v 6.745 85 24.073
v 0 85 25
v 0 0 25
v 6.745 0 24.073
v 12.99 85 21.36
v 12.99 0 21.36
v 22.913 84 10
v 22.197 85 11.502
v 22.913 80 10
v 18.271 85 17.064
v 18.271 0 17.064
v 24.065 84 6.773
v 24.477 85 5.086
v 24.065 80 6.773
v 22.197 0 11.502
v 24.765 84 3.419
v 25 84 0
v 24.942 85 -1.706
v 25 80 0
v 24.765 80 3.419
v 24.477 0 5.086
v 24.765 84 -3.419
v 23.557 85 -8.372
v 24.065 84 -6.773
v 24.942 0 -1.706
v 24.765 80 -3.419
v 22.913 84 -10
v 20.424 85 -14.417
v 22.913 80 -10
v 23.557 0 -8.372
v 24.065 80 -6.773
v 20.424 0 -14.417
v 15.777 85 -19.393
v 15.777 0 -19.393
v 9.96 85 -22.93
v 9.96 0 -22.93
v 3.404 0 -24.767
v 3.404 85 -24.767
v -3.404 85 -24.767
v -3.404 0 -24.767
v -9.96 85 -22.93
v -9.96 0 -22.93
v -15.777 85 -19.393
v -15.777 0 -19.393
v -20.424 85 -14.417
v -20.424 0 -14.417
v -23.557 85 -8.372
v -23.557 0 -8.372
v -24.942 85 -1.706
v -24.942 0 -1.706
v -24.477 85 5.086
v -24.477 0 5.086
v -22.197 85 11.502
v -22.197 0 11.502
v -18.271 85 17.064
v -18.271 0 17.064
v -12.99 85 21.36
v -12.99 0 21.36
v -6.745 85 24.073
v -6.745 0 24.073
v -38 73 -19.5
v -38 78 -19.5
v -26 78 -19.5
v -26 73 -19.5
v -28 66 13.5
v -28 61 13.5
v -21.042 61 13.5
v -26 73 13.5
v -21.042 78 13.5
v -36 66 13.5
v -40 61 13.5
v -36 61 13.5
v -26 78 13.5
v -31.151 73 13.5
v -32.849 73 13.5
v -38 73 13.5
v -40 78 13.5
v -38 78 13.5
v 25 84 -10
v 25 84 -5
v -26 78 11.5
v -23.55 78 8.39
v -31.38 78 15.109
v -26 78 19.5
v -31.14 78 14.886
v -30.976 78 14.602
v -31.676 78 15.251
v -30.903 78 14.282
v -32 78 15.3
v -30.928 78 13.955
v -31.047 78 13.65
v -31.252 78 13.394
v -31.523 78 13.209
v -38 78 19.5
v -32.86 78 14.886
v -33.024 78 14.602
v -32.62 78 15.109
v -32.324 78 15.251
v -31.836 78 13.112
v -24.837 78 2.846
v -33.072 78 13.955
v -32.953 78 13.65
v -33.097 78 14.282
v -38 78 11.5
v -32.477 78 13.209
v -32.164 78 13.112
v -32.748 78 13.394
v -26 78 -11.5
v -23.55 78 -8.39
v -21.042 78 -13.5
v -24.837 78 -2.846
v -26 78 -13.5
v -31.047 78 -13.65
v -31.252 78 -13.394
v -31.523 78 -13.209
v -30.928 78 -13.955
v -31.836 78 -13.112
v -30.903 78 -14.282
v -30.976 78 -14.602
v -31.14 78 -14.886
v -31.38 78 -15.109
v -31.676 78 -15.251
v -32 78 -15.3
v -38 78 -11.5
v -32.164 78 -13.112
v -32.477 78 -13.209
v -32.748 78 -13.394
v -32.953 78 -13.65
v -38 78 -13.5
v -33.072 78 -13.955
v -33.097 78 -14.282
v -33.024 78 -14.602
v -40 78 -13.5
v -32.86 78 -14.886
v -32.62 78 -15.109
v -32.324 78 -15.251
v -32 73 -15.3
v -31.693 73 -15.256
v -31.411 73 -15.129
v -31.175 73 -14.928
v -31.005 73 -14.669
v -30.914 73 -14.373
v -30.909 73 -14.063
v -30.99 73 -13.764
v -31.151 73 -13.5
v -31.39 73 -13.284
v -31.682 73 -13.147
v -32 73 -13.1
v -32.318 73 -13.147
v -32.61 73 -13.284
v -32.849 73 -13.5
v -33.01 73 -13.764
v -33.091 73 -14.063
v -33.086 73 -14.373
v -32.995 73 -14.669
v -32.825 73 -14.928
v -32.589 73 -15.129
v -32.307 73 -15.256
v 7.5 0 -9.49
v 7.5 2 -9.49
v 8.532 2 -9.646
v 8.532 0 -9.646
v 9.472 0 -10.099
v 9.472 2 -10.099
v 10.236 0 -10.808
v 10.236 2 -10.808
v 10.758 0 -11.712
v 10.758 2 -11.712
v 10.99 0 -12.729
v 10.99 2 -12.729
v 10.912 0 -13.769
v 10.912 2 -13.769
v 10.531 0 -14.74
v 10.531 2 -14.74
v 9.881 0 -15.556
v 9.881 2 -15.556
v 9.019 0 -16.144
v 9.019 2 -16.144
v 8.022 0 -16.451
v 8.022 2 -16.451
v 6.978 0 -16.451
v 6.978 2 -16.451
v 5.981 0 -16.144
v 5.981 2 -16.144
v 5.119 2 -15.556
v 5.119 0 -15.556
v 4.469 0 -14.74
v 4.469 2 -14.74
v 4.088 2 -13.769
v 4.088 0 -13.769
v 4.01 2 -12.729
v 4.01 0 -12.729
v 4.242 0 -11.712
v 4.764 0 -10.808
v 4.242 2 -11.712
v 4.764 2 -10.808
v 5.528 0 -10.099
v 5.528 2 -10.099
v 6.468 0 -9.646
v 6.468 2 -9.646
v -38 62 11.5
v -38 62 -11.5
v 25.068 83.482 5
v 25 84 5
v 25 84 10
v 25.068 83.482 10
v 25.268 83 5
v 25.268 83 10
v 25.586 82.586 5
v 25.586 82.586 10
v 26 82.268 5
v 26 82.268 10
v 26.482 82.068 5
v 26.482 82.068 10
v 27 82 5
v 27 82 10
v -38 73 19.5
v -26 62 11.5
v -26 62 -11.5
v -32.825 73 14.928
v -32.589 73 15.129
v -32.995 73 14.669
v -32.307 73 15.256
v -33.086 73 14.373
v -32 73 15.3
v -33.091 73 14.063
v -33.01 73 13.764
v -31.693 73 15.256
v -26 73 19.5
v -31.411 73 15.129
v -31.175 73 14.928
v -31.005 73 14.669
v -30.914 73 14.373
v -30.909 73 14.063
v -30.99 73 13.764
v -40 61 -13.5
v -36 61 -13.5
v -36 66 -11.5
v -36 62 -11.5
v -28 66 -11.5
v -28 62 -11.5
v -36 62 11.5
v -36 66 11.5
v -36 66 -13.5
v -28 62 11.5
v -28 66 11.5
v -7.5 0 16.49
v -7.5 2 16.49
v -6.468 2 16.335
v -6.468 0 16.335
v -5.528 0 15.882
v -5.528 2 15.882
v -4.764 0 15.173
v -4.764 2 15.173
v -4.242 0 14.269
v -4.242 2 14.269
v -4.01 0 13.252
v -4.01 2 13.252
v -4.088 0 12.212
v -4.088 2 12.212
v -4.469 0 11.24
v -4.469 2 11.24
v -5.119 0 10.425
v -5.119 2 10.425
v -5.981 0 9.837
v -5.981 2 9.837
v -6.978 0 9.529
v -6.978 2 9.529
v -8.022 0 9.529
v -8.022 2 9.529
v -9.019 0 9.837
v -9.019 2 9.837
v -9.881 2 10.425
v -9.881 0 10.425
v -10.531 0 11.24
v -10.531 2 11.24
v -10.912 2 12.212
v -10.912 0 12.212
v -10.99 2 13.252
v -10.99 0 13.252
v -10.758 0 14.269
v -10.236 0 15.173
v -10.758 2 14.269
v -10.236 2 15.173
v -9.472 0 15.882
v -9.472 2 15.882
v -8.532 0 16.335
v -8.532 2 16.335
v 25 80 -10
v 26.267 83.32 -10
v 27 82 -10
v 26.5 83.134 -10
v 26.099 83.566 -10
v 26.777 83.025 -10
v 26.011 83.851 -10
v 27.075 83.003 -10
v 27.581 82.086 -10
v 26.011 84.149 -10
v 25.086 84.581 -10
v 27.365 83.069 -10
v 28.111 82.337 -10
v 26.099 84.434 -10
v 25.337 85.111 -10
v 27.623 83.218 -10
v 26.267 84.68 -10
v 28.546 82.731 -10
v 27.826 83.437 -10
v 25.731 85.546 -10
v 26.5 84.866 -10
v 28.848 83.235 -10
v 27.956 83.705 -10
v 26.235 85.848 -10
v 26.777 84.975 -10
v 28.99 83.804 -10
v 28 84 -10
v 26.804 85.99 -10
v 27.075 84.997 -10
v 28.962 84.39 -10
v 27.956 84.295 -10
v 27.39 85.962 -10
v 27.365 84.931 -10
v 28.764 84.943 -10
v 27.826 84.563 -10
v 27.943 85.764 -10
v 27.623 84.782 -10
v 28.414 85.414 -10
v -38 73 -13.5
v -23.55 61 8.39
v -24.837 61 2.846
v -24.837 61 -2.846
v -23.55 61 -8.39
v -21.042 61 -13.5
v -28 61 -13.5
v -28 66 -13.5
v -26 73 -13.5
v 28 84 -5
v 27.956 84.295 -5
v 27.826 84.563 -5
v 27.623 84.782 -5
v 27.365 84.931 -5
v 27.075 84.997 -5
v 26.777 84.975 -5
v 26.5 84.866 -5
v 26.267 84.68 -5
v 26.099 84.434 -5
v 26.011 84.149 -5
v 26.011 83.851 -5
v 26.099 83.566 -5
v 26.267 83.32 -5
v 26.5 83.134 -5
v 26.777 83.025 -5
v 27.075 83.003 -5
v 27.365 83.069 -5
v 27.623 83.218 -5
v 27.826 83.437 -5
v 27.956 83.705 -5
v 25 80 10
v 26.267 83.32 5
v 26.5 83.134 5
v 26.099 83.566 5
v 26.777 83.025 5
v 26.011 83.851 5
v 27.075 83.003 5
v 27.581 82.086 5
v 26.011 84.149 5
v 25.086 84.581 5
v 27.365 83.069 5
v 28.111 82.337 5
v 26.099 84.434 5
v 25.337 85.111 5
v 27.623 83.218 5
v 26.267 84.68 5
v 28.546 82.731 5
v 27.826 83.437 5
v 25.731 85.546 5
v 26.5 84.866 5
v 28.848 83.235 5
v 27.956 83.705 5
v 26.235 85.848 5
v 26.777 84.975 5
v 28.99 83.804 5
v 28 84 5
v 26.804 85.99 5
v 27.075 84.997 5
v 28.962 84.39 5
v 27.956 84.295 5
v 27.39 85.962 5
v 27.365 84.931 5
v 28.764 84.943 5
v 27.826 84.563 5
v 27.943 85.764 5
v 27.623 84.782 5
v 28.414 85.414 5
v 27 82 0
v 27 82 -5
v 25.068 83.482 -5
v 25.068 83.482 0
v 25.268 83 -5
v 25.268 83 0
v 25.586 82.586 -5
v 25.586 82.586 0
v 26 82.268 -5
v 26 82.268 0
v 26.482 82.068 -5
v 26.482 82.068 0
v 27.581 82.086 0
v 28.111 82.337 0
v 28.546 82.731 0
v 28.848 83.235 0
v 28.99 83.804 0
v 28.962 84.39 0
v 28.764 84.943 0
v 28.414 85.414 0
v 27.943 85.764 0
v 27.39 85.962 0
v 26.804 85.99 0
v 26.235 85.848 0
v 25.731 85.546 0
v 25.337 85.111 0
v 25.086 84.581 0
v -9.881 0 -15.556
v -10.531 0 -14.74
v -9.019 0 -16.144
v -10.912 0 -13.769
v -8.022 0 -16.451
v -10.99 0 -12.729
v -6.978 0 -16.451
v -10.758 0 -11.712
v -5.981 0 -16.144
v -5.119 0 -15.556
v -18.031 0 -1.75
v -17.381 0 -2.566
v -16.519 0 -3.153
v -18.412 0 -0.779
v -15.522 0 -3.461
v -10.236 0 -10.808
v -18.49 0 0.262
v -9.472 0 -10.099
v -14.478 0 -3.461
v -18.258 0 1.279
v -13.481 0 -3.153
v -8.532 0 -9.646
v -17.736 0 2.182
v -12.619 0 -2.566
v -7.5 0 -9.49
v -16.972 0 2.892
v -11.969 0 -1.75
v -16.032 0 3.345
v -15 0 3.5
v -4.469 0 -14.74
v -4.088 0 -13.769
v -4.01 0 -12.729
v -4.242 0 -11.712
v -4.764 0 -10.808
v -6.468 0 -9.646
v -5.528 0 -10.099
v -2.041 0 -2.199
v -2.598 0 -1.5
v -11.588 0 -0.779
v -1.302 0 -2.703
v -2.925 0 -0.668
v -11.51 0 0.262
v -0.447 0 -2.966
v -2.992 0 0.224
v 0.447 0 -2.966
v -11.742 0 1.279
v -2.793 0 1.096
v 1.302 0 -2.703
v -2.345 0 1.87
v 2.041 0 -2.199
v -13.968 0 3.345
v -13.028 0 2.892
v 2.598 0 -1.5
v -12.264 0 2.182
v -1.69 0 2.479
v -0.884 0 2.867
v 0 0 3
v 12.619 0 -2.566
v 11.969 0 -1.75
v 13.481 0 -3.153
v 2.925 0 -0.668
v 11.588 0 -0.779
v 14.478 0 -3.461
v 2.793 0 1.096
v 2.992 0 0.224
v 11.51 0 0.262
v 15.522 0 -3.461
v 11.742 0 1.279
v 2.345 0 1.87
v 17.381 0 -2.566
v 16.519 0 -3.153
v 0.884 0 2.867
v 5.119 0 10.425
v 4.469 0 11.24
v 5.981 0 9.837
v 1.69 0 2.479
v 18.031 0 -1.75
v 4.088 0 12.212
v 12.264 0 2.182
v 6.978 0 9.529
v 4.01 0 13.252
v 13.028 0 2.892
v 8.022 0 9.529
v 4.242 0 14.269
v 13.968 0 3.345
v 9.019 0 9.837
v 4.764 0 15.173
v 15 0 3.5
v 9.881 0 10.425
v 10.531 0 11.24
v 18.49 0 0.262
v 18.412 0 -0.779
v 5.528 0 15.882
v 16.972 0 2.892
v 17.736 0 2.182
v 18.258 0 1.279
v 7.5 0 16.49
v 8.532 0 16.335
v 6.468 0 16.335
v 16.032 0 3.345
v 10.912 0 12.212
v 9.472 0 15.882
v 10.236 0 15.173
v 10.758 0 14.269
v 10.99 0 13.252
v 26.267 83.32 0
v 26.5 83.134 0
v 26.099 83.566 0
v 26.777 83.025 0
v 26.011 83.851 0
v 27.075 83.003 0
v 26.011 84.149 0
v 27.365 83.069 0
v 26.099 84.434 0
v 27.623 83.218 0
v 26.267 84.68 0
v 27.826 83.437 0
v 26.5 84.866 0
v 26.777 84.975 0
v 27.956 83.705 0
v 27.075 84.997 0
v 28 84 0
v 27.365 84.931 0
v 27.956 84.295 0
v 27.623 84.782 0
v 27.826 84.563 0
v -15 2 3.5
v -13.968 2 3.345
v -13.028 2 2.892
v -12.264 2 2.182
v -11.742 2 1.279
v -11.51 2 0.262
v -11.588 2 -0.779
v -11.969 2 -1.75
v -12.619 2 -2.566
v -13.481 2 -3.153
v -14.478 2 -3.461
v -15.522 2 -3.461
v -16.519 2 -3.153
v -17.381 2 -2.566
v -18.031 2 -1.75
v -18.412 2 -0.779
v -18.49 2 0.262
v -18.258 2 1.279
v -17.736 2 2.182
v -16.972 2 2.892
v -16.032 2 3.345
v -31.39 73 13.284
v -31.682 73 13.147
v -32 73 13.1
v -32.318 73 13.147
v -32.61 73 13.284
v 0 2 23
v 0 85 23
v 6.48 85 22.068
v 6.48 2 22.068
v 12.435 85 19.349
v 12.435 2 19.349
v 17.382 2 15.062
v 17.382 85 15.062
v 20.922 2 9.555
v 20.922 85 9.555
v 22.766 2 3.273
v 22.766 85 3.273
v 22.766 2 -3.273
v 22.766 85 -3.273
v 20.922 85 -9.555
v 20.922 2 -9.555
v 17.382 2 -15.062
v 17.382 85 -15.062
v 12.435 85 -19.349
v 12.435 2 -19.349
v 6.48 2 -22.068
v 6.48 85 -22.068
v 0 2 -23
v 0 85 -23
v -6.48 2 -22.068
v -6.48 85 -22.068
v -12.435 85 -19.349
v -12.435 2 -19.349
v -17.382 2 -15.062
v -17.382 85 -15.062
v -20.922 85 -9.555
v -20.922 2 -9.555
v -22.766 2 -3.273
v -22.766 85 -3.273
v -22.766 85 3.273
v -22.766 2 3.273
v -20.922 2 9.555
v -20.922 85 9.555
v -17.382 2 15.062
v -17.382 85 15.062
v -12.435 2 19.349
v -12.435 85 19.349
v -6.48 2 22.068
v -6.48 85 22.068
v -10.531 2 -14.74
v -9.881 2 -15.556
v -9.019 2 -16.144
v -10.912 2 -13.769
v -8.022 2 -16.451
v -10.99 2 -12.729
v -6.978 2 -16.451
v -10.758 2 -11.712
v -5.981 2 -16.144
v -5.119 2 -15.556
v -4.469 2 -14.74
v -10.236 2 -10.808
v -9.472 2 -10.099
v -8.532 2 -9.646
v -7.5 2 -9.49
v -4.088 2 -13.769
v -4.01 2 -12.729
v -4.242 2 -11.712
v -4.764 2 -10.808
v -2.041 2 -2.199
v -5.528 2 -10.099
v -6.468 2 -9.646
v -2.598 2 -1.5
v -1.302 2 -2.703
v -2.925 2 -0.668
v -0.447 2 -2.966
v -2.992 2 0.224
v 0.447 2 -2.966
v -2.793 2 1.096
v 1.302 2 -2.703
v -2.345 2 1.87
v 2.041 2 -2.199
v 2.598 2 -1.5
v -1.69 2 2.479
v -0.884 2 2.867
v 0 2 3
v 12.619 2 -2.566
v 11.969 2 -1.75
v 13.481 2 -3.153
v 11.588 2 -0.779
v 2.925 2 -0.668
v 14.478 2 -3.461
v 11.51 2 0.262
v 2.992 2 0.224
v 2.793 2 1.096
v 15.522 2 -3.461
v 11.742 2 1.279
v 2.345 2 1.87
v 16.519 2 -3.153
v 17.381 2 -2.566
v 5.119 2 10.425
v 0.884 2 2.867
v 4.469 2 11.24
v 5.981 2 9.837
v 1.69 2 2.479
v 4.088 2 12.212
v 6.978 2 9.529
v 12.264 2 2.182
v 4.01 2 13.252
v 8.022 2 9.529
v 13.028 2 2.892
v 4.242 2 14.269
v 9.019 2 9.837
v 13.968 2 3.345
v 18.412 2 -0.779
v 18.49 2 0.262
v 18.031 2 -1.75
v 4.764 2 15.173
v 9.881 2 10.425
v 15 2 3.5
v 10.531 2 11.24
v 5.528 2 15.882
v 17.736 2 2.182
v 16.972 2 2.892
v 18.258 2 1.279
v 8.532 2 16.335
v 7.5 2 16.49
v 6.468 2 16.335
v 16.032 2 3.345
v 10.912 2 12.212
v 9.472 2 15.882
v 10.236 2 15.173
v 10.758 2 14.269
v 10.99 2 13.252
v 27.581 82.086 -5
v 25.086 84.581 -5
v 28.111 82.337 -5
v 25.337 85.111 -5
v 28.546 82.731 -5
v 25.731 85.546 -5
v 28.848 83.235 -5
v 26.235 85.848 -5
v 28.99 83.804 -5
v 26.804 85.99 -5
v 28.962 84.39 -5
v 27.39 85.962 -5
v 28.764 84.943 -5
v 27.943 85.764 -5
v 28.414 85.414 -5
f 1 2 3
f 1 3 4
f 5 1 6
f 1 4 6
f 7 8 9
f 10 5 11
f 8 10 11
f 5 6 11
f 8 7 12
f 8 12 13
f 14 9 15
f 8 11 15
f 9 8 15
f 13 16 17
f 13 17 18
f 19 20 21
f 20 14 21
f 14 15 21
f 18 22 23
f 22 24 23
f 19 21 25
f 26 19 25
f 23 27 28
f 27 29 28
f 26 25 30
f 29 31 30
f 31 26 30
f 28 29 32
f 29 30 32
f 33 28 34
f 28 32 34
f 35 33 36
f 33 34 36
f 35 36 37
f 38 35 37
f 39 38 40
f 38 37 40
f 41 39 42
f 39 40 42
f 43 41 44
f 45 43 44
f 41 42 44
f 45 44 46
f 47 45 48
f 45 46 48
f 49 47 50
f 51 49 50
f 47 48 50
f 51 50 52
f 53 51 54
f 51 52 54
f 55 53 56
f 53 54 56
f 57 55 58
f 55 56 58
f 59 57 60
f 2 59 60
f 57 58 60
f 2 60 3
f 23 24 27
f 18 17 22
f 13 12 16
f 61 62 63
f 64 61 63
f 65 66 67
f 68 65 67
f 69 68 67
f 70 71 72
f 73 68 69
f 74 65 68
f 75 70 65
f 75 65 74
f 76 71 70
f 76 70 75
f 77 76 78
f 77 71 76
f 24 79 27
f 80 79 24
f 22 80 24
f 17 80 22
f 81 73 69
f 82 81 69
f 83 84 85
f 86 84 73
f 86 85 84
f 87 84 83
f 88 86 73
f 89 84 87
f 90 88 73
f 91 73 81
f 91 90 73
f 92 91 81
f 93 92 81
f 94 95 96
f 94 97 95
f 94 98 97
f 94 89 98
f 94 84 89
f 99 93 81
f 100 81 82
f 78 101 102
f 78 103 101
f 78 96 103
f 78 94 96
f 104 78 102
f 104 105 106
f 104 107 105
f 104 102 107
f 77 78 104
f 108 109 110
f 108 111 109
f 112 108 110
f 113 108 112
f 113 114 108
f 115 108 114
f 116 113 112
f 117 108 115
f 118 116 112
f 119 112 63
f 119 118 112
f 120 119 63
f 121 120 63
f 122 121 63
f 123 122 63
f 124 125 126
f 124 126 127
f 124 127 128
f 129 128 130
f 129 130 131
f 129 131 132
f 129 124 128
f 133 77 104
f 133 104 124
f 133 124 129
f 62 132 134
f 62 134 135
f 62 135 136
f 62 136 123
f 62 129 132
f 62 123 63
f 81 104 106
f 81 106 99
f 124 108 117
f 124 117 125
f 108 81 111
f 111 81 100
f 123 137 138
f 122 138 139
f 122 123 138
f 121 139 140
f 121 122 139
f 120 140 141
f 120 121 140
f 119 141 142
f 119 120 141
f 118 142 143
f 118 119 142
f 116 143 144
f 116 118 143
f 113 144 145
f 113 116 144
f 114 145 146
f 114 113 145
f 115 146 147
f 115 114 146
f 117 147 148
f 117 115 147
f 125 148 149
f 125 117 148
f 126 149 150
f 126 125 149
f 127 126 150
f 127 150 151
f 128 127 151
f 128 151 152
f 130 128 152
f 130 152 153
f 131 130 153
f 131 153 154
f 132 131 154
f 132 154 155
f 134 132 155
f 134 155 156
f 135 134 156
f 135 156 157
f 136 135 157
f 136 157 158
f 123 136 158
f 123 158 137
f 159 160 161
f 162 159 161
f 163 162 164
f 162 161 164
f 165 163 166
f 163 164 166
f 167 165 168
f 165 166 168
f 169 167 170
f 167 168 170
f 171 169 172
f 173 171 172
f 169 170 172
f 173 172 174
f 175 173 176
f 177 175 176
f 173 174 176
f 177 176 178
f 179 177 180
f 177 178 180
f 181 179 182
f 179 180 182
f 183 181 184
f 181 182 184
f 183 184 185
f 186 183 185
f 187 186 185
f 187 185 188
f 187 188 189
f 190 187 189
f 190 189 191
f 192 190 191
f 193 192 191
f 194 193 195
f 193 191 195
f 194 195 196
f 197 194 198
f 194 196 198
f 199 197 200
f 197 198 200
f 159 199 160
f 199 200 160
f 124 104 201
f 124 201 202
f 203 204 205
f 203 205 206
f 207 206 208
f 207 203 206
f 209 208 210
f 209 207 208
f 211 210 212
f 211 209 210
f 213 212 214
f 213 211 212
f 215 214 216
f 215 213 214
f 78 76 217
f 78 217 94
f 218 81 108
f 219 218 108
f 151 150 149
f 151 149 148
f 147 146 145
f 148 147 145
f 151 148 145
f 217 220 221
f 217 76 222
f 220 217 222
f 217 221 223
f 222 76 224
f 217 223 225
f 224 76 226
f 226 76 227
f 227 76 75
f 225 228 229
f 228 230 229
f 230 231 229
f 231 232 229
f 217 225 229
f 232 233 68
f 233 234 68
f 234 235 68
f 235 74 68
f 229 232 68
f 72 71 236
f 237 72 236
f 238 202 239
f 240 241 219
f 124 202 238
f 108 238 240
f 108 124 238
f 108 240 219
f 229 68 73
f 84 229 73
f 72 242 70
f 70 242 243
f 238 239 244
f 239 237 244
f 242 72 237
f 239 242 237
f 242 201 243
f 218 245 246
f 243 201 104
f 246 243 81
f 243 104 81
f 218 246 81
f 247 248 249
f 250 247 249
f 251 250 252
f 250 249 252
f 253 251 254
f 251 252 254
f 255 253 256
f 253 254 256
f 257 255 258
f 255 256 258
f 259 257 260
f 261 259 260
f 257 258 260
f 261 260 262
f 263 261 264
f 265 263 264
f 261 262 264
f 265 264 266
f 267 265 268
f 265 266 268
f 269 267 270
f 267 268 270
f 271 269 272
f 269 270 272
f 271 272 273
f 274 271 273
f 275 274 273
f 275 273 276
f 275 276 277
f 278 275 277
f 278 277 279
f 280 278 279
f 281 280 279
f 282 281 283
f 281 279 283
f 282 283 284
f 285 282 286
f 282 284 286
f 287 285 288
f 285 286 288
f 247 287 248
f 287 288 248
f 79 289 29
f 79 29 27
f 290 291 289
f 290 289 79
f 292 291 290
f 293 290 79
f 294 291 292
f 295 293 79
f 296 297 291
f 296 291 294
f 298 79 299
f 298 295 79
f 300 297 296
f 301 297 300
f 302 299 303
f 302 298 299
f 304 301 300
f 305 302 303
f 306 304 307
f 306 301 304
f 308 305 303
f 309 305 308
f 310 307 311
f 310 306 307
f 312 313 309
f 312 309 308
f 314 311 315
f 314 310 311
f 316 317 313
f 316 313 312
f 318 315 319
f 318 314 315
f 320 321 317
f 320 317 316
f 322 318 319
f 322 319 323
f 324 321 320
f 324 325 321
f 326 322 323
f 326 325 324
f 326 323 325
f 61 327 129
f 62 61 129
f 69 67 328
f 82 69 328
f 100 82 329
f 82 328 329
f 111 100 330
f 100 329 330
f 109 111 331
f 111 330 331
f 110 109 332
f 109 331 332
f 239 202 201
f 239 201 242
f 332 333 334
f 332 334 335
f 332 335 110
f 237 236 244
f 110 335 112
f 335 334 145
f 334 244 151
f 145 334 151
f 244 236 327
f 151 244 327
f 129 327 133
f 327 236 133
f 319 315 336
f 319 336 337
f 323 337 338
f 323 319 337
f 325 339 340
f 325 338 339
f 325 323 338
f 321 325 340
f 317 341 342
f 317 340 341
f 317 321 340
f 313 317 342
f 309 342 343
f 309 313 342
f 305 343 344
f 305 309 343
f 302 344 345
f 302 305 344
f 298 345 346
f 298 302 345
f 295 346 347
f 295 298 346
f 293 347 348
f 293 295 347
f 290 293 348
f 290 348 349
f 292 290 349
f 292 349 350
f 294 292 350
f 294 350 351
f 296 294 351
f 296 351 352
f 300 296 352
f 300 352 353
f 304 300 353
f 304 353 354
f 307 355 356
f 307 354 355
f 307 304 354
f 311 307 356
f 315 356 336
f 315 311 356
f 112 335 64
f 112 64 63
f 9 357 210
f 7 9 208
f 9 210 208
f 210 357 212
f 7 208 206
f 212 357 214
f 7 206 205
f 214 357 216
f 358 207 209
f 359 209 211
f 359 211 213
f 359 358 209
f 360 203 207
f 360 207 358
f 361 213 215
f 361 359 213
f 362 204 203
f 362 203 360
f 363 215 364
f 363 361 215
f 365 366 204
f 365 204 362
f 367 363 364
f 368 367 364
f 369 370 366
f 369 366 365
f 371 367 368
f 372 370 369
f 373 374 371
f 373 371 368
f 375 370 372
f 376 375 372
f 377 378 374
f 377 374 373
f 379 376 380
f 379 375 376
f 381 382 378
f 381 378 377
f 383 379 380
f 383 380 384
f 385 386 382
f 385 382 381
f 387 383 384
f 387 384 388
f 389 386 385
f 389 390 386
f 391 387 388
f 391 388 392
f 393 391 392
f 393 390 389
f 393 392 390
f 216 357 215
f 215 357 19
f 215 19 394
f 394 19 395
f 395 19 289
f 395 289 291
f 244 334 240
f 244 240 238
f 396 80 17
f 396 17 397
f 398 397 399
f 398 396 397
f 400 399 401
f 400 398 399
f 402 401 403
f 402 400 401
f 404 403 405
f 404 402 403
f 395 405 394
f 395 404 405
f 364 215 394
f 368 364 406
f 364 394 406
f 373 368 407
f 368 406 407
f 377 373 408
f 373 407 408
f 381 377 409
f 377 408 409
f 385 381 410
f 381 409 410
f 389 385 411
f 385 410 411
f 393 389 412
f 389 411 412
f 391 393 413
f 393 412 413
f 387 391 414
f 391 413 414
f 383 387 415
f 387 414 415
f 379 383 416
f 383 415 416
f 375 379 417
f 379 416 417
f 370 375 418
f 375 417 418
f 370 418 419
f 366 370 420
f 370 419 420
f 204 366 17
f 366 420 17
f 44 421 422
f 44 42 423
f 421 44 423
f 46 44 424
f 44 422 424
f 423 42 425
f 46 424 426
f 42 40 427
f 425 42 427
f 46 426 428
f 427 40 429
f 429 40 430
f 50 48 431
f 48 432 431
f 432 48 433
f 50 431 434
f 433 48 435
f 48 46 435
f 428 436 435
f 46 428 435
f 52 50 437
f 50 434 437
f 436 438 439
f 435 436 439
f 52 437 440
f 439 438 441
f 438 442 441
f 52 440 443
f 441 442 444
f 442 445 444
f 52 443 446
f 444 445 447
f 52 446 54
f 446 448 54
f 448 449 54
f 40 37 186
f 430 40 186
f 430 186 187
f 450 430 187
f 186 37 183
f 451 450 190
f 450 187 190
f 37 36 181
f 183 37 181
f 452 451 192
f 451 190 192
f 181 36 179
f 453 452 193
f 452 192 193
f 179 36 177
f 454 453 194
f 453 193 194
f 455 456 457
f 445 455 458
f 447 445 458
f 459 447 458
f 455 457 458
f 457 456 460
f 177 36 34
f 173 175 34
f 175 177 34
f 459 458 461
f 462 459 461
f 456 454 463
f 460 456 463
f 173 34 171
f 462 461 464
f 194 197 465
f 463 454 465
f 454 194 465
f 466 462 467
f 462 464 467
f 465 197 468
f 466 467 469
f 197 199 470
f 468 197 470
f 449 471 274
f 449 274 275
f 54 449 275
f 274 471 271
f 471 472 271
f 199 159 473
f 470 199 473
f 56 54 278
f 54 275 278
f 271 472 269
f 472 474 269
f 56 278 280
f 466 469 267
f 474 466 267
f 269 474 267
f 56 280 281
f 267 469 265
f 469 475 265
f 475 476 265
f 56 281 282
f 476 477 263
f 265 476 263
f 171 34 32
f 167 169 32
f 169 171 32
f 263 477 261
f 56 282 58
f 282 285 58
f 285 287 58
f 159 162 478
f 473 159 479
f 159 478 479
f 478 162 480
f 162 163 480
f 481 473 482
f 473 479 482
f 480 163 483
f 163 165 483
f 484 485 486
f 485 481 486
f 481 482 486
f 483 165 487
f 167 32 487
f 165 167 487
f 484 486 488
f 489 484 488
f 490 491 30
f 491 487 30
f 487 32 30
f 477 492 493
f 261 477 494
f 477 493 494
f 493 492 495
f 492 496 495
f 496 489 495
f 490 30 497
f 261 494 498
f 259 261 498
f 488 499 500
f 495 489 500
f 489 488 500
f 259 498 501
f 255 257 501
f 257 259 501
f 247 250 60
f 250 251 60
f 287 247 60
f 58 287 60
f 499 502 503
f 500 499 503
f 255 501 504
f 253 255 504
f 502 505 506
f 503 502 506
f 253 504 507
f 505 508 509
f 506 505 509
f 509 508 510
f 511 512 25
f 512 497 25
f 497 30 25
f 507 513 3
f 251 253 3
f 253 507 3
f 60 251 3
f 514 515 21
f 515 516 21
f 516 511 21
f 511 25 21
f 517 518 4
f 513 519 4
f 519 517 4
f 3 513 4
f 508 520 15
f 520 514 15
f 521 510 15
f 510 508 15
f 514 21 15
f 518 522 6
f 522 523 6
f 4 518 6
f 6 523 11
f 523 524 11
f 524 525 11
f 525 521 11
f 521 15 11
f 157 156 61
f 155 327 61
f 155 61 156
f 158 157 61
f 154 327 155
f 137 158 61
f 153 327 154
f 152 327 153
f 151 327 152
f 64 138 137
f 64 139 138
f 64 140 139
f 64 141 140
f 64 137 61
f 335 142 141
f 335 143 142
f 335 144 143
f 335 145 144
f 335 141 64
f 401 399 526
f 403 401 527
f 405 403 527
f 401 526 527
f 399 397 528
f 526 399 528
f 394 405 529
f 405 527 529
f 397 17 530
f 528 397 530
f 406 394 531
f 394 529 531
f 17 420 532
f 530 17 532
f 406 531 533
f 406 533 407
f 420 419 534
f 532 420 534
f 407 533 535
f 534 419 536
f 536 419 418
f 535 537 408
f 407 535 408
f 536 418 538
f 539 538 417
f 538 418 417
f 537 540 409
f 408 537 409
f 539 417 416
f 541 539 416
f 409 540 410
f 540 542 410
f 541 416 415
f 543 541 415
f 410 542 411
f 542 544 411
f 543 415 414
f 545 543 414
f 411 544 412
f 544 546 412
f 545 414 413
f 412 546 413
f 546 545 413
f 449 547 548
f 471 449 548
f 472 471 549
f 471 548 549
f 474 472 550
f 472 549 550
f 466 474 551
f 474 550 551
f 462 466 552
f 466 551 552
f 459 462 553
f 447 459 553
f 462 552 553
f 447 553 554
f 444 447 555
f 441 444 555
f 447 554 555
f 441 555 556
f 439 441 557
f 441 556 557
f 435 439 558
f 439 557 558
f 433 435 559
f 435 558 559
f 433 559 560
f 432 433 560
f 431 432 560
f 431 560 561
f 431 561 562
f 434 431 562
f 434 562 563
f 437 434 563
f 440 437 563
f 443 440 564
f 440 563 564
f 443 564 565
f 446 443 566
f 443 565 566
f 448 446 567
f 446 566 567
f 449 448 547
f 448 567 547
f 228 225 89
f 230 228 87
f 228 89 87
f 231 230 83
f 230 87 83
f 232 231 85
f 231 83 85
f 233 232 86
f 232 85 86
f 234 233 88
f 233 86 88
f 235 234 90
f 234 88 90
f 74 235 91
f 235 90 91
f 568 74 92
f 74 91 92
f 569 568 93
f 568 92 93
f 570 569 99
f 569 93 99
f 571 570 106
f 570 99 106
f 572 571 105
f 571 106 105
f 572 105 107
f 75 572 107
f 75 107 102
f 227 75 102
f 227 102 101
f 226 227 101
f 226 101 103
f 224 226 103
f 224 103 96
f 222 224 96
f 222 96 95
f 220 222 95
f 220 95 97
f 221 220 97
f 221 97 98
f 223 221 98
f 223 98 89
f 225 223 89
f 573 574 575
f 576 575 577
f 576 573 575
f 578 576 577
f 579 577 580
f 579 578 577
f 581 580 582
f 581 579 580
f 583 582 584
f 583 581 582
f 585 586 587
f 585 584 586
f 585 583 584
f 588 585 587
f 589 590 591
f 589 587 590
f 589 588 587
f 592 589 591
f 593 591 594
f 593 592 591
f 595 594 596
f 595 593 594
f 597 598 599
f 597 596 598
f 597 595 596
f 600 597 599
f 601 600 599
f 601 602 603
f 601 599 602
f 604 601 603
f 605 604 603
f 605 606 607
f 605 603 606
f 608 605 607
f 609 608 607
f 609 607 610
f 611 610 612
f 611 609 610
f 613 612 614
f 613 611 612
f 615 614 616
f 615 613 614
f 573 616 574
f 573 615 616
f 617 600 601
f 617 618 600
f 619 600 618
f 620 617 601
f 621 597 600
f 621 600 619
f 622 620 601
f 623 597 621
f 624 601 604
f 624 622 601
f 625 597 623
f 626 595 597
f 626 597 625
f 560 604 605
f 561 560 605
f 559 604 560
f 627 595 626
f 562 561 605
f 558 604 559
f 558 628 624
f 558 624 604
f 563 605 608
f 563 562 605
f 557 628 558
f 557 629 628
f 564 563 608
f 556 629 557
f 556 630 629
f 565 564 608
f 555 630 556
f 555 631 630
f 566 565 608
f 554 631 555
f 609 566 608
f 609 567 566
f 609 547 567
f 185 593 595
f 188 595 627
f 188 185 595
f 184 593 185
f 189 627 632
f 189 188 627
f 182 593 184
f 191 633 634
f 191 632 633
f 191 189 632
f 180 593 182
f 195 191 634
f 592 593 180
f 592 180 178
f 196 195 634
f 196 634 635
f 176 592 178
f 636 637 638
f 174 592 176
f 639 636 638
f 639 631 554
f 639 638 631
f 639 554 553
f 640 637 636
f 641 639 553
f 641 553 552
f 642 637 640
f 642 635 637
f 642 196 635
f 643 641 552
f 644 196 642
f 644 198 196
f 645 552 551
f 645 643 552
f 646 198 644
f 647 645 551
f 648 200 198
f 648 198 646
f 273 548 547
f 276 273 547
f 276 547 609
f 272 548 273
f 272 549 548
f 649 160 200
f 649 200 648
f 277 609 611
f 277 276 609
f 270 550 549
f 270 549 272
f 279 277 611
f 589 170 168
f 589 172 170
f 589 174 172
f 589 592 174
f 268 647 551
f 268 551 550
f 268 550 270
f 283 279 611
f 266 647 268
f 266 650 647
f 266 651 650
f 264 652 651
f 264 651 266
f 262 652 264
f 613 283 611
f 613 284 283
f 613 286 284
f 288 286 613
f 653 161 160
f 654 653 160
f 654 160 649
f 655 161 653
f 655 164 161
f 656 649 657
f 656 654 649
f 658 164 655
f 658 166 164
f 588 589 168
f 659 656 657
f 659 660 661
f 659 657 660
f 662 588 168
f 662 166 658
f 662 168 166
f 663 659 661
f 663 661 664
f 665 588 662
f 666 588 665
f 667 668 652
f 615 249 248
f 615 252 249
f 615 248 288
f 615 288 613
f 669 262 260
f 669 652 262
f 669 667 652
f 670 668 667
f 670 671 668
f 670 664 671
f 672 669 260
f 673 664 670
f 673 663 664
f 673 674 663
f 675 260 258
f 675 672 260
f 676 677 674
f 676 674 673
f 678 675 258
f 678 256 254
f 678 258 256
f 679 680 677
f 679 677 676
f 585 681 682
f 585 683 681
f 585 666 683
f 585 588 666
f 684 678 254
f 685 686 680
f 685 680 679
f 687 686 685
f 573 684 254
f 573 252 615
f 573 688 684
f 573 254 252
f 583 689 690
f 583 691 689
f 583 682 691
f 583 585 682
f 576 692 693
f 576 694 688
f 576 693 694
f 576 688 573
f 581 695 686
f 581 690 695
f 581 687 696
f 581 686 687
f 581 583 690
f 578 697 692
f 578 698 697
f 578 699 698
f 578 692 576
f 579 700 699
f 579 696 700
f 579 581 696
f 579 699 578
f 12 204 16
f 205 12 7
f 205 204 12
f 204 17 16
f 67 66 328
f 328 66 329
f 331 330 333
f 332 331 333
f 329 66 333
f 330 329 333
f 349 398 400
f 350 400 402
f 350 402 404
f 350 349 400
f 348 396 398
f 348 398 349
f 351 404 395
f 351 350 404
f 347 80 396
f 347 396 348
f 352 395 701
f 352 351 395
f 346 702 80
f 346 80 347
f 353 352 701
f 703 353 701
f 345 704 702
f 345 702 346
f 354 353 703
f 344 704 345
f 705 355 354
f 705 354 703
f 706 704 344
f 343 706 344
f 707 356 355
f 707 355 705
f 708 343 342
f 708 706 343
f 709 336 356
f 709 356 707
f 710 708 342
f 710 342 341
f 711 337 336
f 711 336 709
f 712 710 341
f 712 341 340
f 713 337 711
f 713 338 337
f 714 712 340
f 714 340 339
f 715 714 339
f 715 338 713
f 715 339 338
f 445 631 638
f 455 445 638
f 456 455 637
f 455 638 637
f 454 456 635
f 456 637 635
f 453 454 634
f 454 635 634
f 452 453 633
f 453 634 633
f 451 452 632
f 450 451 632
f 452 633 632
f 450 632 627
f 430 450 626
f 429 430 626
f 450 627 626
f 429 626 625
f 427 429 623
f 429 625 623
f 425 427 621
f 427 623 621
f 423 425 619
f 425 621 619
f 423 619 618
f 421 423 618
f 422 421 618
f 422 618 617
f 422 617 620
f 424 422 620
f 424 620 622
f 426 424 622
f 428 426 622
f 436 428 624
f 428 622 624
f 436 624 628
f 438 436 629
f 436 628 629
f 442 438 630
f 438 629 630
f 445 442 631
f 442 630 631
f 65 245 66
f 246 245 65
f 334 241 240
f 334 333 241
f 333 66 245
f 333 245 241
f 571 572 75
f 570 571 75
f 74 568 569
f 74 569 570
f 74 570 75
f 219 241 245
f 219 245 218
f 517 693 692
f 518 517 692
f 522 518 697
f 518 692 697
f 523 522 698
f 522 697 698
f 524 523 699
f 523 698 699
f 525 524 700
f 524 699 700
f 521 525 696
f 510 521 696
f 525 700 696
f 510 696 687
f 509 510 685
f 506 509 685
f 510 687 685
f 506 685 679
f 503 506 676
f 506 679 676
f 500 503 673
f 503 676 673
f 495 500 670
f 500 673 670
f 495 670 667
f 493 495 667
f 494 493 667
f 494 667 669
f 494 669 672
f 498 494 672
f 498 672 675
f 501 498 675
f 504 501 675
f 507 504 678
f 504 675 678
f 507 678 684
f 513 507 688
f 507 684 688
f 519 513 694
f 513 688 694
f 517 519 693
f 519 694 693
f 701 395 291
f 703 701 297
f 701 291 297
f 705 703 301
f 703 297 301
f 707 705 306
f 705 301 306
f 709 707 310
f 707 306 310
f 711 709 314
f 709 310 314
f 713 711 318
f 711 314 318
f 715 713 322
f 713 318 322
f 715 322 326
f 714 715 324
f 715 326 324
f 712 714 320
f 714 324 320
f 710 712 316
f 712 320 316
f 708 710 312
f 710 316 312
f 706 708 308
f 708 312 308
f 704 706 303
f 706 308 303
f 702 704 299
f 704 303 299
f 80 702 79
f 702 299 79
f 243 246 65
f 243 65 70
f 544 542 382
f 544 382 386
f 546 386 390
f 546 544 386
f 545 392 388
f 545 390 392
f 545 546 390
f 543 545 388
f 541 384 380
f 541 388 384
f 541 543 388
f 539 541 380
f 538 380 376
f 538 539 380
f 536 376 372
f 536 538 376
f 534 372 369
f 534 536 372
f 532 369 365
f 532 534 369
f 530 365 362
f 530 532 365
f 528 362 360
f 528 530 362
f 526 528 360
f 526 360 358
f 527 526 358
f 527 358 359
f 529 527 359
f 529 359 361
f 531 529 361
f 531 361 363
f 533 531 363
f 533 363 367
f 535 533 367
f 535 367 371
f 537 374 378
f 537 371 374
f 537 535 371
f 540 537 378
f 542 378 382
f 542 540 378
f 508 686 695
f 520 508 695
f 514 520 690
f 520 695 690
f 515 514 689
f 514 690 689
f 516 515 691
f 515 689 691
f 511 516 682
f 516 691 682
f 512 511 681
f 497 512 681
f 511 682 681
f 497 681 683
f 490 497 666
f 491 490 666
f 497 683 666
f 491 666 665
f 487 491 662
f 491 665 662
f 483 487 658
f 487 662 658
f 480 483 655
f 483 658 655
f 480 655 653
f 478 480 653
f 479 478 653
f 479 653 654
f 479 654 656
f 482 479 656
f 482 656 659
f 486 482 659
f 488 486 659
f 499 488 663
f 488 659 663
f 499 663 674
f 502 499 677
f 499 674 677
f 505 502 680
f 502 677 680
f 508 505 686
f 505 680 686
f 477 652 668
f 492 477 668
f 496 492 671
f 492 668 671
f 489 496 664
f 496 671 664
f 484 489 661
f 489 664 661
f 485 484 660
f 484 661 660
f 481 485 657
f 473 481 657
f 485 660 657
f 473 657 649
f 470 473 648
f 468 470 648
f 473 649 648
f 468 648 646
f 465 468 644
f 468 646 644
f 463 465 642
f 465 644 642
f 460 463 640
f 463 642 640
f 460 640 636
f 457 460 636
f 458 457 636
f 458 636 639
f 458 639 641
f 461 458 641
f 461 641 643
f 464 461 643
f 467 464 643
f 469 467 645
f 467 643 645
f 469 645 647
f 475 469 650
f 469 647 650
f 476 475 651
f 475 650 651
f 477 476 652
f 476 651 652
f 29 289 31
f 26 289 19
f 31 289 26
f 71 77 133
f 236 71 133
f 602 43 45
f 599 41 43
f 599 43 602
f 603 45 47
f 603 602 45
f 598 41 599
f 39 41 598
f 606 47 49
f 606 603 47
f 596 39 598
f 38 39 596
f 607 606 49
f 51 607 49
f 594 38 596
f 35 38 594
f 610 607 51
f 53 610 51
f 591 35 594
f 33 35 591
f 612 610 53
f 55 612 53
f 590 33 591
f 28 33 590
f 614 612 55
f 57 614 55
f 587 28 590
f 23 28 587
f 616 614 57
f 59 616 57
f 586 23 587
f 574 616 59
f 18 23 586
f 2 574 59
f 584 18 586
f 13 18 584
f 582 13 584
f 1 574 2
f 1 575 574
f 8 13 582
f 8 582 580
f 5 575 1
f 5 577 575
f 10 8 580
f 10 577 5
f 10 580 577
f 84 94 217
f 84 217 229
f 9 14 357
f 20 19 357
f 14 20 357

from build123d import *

# Parameters (mm, degrees)
SKETCH1_R                            = 25
BOSS_EXTRUDE1_DEPTH                  = 85
SHELL1_T                             = -2
SKETCH2_R                            = 3.5
CUT_EXTRUDE1_DEPTH                   = 2
BOSS_EXTRUDE4_DEPTH                  = 10
BOSS_EXTRUDE4_DEPTH_BACK             = 10
BOSS_EXTRUDE6_REACH                  = 104.572
SKETCH8_W                            = 20
SKETCH8_H                            = 4
CUT_EXTRUDE4_DEPTH                   = 98.272812234
CUT_EXTRUDE4_DEPTH_BACK              = 98.272812234
SKETCH9_R                            = 1
CUT_EXTRUDE5_START                   = -5
SKETCH10_R                           = 2
CUT_EXTRUDE5_DEPTH                   = 5
LPATTERN2_COUNT                      = 2
LPATTERN2_PITCH                      = 10
SKETCH11_W                           = 27
SKETCH11_H                           = 17
BOSS_EXTRUDE7_DEPTH                  = 15
BOSS_EXTRUDE7_DIRECTION_2_REACH      = 106.58
BOSS_EXTRUDE7_DIRECTION_2_END_RADIUS = 25
SKETCH12_W                           = 12
SKETCH12_H                           = 23
CUT_EXTRUDE6_DEPTH                   = 16
SKETCH13_W                           = 12
SKETCH13_H                           = 5
BOSS_EXTRUDE8_DEPTH                  = 6
SKETCH14_R                           = 1.1
CUT_EXTRUDE7_DEPTH                   = 5
CUT_EXTRUDE8_REACH                   = 104.363
SKETCH15_W                           = 8
SKETCH15_H                           = 5
SKETCH16_R                           = 3
CUT_EXTRUDE9_DEPTH                   = 2


with BuildPart() as part:
    # Sketch1 → Boss-Extrude1 (new body)
    with BuildSketch(Plane(origin=(0, 0, 0), x_dir=(1, 0, 0), z_dir=(0, 1, 0))):
        with Locations(Location((0, 0, 0), (0, 0, 270))):
            Circle(SKETCH1_R)
    extrude(amount=BOSS_EXTRUDE1_DEPTH)

    # Shell1
    shell1_openings = [part.faces().sort_by_distance(p)[0] for p in [
        (0, 85, 0),
    ]]
    offset(amount=SHELL1_T, openings=shell1_openings, kind=Kind.INTERSECTION)

    # Sketch2 → Cut-Extrude1 (cut)
    with BuildSketch(Plane(origin=(0, 2, 0), x_dir=(1, 0, 0), z_dir=(0, 1, 0))):
        with Locations(Location((15, 0, 0), (0, 0, 270))):
            Circle(SKETCH2_R)
        with Locations(Location((7.5, -12.990381057, 0), (0, 0, 270))):
            Circle(SKETCH2_R)
        with Locations(Location((-7.5, -12.990381057, 0), (0, 0, 270))):
            Circle(SKETCH2_R)
        with Locations(Location((-15, 0, 0), (0, 0, 270))):
            Circle(SKETCH2_R)
        with Locations(Location((-7.5, 12.990381057, 0), (0, 0, 270))):
            Circle(SKETCH2_R)
        with Locations(Location((7.5, 12.990381057, 0), (0, 0, 270))):
            Circle(SKETCH2_R)
    extrude(amount=-CUT_EXTRUDE1_DEPTH, mode=Mode.SUBTRACT)

    # Sketch8 → Boss-Extrude6 (add, up to next)
    with BuildSketch(Plane.ZY.offset(-25), mode=Mode.PRIVATE) as boss_extrude6_sk1:
        with Locations((0, 82)):
            Rectangle(SKETCH8_W, SKETCH8_H)
    boss_extrude6_tool1 = extrude(boss_extrude6_sk1.sketch, amount=BOSS_EXTRUDE6_REACH, mode=Mode.PRIVATE) - part.part


with BuildPart() as body_2:
    # Sketch3 → Boss-Extrude4 (new, two sides: drawn at the far end of the back side and taken through both)
    with BuildSketch(Plane.XY.offset(-BOSS_EXTRUDE4_DEPTH_BACK)):
        with BuildLine():
            Line((25, 84), (25, 80))
            Line((25, 80), (27, 82))
            ThreePointArc((27, 82), (28.414213562, 85.414213562), (25, 84))
        make_face()
    extrude(amount=BOSS_EXTRUDE4_DEPTH + BOSS_EXTRUDE4_DEPTH_BACK)


with BuildPart() as part_1:
    add(part.part)

    add(body_2.part)  # Boss-Extrude6 merges body 2
    add(boss_extrude6_tool1.solids().sort_by_distance((25, 82, 0))[0])
    add(boss_extrude6_tool1.solids().sort_by_distance((25, 82, 0))[1])

    # Sketch9 → Cut-Extrude4 (cut, two sides: drawn at the far end of the back side and taken through both)
    with BuildSketch(Plane.XY.offset(10).offset(-CUT_EXTRUDE4_DEPTH_BACK)):
        with Locations((27, 84)):
            Circle(SKETCH9_R)
    extrude(amount=CUT_EXTRUDE4_DEPTH + CUT_EXTRUDE4_DEPTH_BACK, mode=Mode.SUBTRACT)

    # Sketch10 → Cut-Extrude5 (cut)
    with BuildSketch(Plane.XY.offset(10).offset(CUT_EXTRUDE5_START)):
        with Locations((27, 84)):
            Circle(SKETCH10_R)
    cut_extrude5 = extrude(amount=CUT_EXTRUDE5_DEPTH, mode=Mode.SUBTRACT)

    # LPattern2: Cut-Extrude5 ×2
    with Locations(*[(0, 0, -i * LPATTERN2_PITCH) for i in range(1, LPATTERN2_COUNT)]):
        add(cut_extrude5, mode=Mode.SUBTRACT)

    # Sketch16 → Cut-Extrude9 (cut)
    with BuildSketch(Plane(origin=(0, 2, 0), x_dir=(1, 0, 0), z_dir=(0, 1, 0))):
        with Locations(Location((0, 0, 0), (0, 0, 270))):
            Circle(SKETCH16_R)
    extrude(amount=-CUT_EXTRUDE9_DEPTH, mode=Mode.SUBTRACT)


with BuildPart() as body_2_2:
    # Sketch11 → Boss-Extrude7 (new body)
    with BuildSketch(Plane(origin=(-25, 0, 0), x_dir=(0, 0, -1), z_dir=(1, 0, 0))):
        with Locations((0, 69.5)):
            Rectangle(SKETCH11_W, SKETCH11_H)
    extrude(amount=-BOSS_EXTRUDE7_DEPTH)

    # Boss-Extrude7 direction 2: up to this cylinder (the profile starts outside it)
    boss_extrude7_direction_2_end = Plane(origin=(0, 69.5, 0), z_dir=(0, -1, 0)) * Cylinder(BOSS_EXTRUDE7_DIRECTION_2_END_RADIUS, 264.16, mode=Mode.PRIVATE)
    # Sketch11 → Boss-Extrude7 direction 2 (add, up to the surface)
    with BuildSketch(Plane(origin=(-25, 0, 0), x_dir=(0, 0, -1), z_dir=(1, 0, 0)), mode=Mode.PRIVATE) as boss_extrude7_direction_2_sk1:
        with Locations((0, 69.5)):
            Rectangle(SKETCH11_W, SKETCH11_H)
    boss_extrude7_direction_2_tool1 = extrude(boss_extrude7_direction_2_sk1.sketch, amount=BOSS_EXTRUDE7_DIRECTION_2_REACH, mode=Mode.PRIVATE) - boss_extrude7_direction_2_end
    add(boss_extrude7_direction_2_tool1.solids().sort_by_distance((-25, 69.5, 0))[0])
    add(boss_extrude7_direction_2_tool1.solids().sort_by_distance((-25, 69.5, 0))[1])

    # Sketch12 → Cut-Extrude6 (cut)
    with BuildSketch(Plane(origin=(0, 78, 0), x_dir=(1, 0, 0), z_dir=(0, 1, 0))):
        with Locations((-32, 0)):
            Rectangle(SKETCH12_W, SKETCH12_H)
    extrude(amount=-CUT_EXTRUDE6_DEPTH, mode=Mode.SUBTRACT)

    # Sketch13 → Boss-Extrude8 (add)
    with BuildSketch(Plane.XY.offset(13.5)):
        with Locations((-32, 75.5)):
            Rectangle(SKETCH13_W, SKETCH13_H)
    boss_extrude8 = extrude(amount=BOSS_EXTRUDE8_DEPTH)

    # Sketch14 → Cut-Extrude7 (cut)
    with BuildSketch(Plane(origin=(0, 78, 0), x_dir=(1, 0, 0), z_dir=(0, 1, 0))):
        with Locations(Location((-32, -14.2, 0), (0, 0, 270))):
            Circle(SKETCH14_R)
    cut_extrude7 = extrude(amount=-CUT_EXTRUDE7_DEPTH, mode=Mode.SUBTRACT)

    # Mirror1: Boss-Extrude8, Cut-Extrude7 across plane
    add(boss_extrude8.mirror(Plane.XY))
    add(cut_extrude7.mirror(Plane.XY), mode=Mode.SUBTRACT)

    # Cut-Extrude8: up to this face of the body (flat: up to its plane)
    cut_extrude8_end = Plane(body_2_2.part.faces().sort_by_distance((-30.182445112, 68.127485799, 13.5))[0])
    # Sketch15 → Cut-Extrude8 (cut, up to the picked face)
    with BuildSketch(Plane(origin=(0, 0, -13.5), x_dir=(-1, 0, 0), z_dir=(0, 0, -1)), mode=Mode.PRIVATE) as cut_extrude8_sk1:
        with Locations((32, 63.5)):
            Rectangle(SKETCH15_W, SKETCH15_H)
    cut_extrude8_tool1 = split(extrude(cut_extrude8_sk1.sketch, amount=-CUT_EXTRUDE8_REACH, mode=Mode.PRIVATE), bisect_by=cut_extrude8_end, keep=Keep.BOTH, mode=Mode.PRIVATE)
    add(cut_extrude8_tool1.solids().sort_by(Axis((-32, 63.5, -13.5), (0, 0, 1)))[0], mode=Mode.SUBTRACT)


solid = Compound([part_1.part, body_2_2.part])
